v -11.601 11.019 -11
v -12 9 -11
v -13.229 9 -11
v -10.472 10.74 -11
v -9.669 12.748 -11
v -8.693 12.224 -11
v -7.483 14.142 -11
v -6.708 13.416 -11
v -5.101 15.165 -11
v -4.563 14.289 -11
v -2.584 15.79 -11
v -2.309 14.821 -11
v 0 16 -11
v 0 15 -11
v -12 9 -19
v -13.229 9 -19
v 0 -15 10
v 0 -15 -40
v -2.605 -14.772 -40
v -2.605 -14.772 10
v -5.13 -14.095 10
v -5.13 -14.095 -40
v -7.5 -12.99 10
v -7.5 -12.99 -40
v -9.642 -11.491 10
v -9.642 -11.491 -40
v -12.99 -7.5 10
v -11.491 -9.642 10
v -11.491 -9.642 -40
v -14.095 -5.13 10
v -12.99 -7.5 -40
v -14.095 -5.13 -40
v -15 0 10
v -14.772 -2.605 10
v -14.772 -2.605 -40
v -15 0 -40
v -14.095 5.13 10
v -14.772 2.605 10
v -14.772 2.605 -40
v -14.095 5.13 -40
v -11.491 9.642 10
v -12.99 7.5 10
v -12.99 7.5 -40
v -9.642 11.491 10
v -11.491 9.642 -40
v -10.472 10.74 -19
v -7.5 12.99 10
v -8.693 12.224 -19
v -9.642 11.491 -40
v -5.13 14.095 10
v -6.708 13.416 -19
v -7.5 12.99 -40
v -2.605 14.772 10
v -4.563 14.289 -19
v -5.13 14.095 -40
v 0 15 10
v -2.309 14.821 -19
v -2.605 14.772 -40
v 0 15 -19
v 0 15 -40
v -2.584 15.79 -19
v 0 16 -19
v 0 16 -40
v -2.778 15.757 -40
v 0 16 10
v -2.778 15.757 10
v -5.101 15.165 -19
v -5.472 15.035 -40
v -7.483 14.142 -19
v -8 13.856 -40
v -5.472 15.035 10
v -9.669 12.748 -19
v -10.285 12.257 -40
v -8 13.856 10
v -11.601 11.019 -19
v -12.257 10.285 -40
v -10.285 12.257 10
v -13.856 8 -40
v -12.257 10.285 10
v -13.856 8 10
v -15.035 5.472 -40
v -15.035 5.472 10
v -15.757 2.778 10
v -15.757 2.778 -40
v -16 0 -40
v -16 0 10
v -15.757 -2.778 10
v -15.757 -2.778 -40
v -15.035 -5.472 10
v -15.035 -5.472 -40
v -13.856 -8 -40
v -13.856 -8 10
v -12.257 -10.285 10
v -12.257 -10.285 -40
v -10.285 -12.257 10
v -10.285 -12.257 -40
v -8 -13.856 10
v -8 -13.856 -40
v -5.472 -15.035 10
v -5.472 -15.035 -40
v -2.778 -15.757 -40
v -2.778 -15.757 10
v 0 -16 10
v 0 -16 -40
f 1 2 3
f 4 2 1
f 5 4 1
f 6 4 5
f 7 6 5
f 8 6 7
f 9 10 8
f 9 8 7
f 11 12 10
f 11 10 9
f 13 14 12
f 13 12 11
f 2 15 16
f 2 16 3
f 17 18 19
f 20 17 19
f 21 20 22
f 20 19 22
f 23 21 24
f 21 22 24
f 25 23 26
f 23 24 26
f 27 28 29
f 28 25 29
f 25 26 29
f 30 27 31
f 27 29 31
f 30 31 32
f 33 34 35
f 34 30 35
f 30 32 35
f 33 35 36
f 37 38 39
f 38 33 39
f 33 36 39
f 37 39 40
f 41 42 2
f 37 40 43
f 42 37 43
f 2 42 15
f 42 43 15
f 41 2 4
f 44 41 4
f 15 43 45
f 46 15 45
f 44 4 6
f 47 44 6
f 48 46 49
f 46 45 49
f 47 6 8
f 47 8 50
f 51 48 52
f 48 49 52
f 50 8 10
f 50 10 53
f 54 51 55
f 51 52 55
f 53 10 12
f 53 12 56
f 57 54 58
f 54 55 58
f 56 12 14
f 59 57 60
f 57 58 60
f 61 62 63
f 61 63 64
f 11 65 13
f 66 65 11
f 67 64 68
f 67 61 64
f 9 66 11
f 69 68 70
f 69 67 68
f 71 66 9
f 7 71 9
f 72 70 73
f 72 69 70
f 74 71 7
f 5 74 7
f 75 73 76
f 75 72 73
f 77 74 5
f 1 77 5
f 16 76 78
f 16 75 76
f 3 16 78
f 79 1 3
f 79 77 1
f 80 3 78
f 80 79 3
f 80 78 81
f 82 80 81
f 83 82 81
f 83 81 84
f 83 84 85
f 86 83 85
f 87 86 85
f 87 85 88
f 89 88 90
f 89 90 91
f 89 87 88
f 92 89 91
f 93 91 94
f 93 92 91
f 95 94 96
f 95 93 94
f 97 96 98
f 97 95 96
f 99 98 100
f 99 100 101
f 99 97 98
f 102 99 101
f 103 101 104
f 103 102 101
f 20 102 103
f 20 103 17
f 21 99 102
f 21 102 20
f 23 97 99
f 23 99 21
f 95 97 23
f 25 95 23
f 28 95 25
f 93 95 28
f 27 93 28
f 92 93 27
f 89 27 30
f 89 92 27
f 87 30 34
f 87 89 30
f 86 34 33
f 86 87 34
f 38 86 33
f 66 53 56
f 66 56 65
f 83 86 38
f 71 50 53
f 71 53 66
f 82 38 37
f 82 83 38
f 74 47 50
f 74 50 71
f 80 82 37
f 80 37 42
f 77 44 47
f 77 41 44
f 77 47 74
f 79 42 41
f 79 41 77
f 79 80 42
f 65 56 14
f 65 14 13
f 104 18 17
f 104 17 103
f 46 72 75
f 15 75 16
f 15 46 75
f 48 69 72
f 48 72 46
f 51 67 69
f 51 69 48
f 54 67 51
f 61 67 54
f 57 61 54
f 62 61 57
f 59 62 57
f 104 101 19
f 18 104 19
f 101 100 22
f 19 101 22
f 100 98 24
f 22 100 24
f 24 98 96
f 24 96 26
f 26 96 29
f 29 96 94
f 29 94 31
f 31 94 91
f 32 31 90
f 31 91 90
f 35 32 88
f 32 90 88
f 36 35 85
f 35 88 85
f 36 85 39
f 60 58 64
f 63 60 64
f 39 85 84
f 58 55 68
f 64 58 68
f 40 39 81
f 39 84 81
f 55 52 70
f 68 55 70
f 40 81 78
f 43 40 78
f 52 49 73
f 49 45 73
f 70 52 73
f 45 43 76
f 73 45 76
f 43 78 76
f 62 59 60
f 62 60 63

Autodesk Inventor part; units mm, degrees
ref_plane "YZ Plane" through (0, 0, 0) normal (1, 0, 0) x (0, 1, 0)
ref_plane "XZ Plane" through (0, 0, 0) normal (0, 1, 0) x (-1, 0, 0)
ref_plane "XY Plane" through (0, 0, 0) normal (0, 0, 1) x (1, 0, 0)
sketch "スケッチ1" plane through (0, 0, 0) normal (1, 0, 0) x (0, 1, 0)
  line L0 (0, 0) -> (15, 0) construction
  line L1 (15, 0) -> (15, -40) construction
  line L2 (15, -40) -> (16, -40)
  line L3 (16, -40) -> (16, 10)
  line L4 (16, 10) -> (15, 10)
  line L5 (15, 10) -> (15, -40)
  line L6 (0, -50) -> (0, 20) projected
  dimension "d0" = 15
  dimension "d2" = 1
  dimension "d3" = 50
revolve "回転1" add sketch "スケッチ1" angle 180 about axis through (0, 0, -10) along (0, 0, 1)
sketch "スケッチ2" plane through (0, 15, 10) normal (1, 0, 0) x (0, 0, -1)
  line L0 (50, 1) -> (0, 1) projected
  line L1 (0, 1) -> (21, 1)
  line L2 (21, 1) -> (29, 1)
  line L3 (29, 1) -> (29, -6)
  line L4 (29, -6) -> (21, -6)
  line L5 (21, -6) -> (21, 1)
  line L6 (0, 1) -> (0, 0) projected
  point P0 (10, -15)
  point P1 (29, 1)
  dimension "d6" = 8
  dimension "d7" = 7
  dimension "d10" = 21
extrude "押し出し1" cut sketch "スケッチ2" against normal through all
properties part number "cover-pipe_L50" material "ステンレス鋼"
